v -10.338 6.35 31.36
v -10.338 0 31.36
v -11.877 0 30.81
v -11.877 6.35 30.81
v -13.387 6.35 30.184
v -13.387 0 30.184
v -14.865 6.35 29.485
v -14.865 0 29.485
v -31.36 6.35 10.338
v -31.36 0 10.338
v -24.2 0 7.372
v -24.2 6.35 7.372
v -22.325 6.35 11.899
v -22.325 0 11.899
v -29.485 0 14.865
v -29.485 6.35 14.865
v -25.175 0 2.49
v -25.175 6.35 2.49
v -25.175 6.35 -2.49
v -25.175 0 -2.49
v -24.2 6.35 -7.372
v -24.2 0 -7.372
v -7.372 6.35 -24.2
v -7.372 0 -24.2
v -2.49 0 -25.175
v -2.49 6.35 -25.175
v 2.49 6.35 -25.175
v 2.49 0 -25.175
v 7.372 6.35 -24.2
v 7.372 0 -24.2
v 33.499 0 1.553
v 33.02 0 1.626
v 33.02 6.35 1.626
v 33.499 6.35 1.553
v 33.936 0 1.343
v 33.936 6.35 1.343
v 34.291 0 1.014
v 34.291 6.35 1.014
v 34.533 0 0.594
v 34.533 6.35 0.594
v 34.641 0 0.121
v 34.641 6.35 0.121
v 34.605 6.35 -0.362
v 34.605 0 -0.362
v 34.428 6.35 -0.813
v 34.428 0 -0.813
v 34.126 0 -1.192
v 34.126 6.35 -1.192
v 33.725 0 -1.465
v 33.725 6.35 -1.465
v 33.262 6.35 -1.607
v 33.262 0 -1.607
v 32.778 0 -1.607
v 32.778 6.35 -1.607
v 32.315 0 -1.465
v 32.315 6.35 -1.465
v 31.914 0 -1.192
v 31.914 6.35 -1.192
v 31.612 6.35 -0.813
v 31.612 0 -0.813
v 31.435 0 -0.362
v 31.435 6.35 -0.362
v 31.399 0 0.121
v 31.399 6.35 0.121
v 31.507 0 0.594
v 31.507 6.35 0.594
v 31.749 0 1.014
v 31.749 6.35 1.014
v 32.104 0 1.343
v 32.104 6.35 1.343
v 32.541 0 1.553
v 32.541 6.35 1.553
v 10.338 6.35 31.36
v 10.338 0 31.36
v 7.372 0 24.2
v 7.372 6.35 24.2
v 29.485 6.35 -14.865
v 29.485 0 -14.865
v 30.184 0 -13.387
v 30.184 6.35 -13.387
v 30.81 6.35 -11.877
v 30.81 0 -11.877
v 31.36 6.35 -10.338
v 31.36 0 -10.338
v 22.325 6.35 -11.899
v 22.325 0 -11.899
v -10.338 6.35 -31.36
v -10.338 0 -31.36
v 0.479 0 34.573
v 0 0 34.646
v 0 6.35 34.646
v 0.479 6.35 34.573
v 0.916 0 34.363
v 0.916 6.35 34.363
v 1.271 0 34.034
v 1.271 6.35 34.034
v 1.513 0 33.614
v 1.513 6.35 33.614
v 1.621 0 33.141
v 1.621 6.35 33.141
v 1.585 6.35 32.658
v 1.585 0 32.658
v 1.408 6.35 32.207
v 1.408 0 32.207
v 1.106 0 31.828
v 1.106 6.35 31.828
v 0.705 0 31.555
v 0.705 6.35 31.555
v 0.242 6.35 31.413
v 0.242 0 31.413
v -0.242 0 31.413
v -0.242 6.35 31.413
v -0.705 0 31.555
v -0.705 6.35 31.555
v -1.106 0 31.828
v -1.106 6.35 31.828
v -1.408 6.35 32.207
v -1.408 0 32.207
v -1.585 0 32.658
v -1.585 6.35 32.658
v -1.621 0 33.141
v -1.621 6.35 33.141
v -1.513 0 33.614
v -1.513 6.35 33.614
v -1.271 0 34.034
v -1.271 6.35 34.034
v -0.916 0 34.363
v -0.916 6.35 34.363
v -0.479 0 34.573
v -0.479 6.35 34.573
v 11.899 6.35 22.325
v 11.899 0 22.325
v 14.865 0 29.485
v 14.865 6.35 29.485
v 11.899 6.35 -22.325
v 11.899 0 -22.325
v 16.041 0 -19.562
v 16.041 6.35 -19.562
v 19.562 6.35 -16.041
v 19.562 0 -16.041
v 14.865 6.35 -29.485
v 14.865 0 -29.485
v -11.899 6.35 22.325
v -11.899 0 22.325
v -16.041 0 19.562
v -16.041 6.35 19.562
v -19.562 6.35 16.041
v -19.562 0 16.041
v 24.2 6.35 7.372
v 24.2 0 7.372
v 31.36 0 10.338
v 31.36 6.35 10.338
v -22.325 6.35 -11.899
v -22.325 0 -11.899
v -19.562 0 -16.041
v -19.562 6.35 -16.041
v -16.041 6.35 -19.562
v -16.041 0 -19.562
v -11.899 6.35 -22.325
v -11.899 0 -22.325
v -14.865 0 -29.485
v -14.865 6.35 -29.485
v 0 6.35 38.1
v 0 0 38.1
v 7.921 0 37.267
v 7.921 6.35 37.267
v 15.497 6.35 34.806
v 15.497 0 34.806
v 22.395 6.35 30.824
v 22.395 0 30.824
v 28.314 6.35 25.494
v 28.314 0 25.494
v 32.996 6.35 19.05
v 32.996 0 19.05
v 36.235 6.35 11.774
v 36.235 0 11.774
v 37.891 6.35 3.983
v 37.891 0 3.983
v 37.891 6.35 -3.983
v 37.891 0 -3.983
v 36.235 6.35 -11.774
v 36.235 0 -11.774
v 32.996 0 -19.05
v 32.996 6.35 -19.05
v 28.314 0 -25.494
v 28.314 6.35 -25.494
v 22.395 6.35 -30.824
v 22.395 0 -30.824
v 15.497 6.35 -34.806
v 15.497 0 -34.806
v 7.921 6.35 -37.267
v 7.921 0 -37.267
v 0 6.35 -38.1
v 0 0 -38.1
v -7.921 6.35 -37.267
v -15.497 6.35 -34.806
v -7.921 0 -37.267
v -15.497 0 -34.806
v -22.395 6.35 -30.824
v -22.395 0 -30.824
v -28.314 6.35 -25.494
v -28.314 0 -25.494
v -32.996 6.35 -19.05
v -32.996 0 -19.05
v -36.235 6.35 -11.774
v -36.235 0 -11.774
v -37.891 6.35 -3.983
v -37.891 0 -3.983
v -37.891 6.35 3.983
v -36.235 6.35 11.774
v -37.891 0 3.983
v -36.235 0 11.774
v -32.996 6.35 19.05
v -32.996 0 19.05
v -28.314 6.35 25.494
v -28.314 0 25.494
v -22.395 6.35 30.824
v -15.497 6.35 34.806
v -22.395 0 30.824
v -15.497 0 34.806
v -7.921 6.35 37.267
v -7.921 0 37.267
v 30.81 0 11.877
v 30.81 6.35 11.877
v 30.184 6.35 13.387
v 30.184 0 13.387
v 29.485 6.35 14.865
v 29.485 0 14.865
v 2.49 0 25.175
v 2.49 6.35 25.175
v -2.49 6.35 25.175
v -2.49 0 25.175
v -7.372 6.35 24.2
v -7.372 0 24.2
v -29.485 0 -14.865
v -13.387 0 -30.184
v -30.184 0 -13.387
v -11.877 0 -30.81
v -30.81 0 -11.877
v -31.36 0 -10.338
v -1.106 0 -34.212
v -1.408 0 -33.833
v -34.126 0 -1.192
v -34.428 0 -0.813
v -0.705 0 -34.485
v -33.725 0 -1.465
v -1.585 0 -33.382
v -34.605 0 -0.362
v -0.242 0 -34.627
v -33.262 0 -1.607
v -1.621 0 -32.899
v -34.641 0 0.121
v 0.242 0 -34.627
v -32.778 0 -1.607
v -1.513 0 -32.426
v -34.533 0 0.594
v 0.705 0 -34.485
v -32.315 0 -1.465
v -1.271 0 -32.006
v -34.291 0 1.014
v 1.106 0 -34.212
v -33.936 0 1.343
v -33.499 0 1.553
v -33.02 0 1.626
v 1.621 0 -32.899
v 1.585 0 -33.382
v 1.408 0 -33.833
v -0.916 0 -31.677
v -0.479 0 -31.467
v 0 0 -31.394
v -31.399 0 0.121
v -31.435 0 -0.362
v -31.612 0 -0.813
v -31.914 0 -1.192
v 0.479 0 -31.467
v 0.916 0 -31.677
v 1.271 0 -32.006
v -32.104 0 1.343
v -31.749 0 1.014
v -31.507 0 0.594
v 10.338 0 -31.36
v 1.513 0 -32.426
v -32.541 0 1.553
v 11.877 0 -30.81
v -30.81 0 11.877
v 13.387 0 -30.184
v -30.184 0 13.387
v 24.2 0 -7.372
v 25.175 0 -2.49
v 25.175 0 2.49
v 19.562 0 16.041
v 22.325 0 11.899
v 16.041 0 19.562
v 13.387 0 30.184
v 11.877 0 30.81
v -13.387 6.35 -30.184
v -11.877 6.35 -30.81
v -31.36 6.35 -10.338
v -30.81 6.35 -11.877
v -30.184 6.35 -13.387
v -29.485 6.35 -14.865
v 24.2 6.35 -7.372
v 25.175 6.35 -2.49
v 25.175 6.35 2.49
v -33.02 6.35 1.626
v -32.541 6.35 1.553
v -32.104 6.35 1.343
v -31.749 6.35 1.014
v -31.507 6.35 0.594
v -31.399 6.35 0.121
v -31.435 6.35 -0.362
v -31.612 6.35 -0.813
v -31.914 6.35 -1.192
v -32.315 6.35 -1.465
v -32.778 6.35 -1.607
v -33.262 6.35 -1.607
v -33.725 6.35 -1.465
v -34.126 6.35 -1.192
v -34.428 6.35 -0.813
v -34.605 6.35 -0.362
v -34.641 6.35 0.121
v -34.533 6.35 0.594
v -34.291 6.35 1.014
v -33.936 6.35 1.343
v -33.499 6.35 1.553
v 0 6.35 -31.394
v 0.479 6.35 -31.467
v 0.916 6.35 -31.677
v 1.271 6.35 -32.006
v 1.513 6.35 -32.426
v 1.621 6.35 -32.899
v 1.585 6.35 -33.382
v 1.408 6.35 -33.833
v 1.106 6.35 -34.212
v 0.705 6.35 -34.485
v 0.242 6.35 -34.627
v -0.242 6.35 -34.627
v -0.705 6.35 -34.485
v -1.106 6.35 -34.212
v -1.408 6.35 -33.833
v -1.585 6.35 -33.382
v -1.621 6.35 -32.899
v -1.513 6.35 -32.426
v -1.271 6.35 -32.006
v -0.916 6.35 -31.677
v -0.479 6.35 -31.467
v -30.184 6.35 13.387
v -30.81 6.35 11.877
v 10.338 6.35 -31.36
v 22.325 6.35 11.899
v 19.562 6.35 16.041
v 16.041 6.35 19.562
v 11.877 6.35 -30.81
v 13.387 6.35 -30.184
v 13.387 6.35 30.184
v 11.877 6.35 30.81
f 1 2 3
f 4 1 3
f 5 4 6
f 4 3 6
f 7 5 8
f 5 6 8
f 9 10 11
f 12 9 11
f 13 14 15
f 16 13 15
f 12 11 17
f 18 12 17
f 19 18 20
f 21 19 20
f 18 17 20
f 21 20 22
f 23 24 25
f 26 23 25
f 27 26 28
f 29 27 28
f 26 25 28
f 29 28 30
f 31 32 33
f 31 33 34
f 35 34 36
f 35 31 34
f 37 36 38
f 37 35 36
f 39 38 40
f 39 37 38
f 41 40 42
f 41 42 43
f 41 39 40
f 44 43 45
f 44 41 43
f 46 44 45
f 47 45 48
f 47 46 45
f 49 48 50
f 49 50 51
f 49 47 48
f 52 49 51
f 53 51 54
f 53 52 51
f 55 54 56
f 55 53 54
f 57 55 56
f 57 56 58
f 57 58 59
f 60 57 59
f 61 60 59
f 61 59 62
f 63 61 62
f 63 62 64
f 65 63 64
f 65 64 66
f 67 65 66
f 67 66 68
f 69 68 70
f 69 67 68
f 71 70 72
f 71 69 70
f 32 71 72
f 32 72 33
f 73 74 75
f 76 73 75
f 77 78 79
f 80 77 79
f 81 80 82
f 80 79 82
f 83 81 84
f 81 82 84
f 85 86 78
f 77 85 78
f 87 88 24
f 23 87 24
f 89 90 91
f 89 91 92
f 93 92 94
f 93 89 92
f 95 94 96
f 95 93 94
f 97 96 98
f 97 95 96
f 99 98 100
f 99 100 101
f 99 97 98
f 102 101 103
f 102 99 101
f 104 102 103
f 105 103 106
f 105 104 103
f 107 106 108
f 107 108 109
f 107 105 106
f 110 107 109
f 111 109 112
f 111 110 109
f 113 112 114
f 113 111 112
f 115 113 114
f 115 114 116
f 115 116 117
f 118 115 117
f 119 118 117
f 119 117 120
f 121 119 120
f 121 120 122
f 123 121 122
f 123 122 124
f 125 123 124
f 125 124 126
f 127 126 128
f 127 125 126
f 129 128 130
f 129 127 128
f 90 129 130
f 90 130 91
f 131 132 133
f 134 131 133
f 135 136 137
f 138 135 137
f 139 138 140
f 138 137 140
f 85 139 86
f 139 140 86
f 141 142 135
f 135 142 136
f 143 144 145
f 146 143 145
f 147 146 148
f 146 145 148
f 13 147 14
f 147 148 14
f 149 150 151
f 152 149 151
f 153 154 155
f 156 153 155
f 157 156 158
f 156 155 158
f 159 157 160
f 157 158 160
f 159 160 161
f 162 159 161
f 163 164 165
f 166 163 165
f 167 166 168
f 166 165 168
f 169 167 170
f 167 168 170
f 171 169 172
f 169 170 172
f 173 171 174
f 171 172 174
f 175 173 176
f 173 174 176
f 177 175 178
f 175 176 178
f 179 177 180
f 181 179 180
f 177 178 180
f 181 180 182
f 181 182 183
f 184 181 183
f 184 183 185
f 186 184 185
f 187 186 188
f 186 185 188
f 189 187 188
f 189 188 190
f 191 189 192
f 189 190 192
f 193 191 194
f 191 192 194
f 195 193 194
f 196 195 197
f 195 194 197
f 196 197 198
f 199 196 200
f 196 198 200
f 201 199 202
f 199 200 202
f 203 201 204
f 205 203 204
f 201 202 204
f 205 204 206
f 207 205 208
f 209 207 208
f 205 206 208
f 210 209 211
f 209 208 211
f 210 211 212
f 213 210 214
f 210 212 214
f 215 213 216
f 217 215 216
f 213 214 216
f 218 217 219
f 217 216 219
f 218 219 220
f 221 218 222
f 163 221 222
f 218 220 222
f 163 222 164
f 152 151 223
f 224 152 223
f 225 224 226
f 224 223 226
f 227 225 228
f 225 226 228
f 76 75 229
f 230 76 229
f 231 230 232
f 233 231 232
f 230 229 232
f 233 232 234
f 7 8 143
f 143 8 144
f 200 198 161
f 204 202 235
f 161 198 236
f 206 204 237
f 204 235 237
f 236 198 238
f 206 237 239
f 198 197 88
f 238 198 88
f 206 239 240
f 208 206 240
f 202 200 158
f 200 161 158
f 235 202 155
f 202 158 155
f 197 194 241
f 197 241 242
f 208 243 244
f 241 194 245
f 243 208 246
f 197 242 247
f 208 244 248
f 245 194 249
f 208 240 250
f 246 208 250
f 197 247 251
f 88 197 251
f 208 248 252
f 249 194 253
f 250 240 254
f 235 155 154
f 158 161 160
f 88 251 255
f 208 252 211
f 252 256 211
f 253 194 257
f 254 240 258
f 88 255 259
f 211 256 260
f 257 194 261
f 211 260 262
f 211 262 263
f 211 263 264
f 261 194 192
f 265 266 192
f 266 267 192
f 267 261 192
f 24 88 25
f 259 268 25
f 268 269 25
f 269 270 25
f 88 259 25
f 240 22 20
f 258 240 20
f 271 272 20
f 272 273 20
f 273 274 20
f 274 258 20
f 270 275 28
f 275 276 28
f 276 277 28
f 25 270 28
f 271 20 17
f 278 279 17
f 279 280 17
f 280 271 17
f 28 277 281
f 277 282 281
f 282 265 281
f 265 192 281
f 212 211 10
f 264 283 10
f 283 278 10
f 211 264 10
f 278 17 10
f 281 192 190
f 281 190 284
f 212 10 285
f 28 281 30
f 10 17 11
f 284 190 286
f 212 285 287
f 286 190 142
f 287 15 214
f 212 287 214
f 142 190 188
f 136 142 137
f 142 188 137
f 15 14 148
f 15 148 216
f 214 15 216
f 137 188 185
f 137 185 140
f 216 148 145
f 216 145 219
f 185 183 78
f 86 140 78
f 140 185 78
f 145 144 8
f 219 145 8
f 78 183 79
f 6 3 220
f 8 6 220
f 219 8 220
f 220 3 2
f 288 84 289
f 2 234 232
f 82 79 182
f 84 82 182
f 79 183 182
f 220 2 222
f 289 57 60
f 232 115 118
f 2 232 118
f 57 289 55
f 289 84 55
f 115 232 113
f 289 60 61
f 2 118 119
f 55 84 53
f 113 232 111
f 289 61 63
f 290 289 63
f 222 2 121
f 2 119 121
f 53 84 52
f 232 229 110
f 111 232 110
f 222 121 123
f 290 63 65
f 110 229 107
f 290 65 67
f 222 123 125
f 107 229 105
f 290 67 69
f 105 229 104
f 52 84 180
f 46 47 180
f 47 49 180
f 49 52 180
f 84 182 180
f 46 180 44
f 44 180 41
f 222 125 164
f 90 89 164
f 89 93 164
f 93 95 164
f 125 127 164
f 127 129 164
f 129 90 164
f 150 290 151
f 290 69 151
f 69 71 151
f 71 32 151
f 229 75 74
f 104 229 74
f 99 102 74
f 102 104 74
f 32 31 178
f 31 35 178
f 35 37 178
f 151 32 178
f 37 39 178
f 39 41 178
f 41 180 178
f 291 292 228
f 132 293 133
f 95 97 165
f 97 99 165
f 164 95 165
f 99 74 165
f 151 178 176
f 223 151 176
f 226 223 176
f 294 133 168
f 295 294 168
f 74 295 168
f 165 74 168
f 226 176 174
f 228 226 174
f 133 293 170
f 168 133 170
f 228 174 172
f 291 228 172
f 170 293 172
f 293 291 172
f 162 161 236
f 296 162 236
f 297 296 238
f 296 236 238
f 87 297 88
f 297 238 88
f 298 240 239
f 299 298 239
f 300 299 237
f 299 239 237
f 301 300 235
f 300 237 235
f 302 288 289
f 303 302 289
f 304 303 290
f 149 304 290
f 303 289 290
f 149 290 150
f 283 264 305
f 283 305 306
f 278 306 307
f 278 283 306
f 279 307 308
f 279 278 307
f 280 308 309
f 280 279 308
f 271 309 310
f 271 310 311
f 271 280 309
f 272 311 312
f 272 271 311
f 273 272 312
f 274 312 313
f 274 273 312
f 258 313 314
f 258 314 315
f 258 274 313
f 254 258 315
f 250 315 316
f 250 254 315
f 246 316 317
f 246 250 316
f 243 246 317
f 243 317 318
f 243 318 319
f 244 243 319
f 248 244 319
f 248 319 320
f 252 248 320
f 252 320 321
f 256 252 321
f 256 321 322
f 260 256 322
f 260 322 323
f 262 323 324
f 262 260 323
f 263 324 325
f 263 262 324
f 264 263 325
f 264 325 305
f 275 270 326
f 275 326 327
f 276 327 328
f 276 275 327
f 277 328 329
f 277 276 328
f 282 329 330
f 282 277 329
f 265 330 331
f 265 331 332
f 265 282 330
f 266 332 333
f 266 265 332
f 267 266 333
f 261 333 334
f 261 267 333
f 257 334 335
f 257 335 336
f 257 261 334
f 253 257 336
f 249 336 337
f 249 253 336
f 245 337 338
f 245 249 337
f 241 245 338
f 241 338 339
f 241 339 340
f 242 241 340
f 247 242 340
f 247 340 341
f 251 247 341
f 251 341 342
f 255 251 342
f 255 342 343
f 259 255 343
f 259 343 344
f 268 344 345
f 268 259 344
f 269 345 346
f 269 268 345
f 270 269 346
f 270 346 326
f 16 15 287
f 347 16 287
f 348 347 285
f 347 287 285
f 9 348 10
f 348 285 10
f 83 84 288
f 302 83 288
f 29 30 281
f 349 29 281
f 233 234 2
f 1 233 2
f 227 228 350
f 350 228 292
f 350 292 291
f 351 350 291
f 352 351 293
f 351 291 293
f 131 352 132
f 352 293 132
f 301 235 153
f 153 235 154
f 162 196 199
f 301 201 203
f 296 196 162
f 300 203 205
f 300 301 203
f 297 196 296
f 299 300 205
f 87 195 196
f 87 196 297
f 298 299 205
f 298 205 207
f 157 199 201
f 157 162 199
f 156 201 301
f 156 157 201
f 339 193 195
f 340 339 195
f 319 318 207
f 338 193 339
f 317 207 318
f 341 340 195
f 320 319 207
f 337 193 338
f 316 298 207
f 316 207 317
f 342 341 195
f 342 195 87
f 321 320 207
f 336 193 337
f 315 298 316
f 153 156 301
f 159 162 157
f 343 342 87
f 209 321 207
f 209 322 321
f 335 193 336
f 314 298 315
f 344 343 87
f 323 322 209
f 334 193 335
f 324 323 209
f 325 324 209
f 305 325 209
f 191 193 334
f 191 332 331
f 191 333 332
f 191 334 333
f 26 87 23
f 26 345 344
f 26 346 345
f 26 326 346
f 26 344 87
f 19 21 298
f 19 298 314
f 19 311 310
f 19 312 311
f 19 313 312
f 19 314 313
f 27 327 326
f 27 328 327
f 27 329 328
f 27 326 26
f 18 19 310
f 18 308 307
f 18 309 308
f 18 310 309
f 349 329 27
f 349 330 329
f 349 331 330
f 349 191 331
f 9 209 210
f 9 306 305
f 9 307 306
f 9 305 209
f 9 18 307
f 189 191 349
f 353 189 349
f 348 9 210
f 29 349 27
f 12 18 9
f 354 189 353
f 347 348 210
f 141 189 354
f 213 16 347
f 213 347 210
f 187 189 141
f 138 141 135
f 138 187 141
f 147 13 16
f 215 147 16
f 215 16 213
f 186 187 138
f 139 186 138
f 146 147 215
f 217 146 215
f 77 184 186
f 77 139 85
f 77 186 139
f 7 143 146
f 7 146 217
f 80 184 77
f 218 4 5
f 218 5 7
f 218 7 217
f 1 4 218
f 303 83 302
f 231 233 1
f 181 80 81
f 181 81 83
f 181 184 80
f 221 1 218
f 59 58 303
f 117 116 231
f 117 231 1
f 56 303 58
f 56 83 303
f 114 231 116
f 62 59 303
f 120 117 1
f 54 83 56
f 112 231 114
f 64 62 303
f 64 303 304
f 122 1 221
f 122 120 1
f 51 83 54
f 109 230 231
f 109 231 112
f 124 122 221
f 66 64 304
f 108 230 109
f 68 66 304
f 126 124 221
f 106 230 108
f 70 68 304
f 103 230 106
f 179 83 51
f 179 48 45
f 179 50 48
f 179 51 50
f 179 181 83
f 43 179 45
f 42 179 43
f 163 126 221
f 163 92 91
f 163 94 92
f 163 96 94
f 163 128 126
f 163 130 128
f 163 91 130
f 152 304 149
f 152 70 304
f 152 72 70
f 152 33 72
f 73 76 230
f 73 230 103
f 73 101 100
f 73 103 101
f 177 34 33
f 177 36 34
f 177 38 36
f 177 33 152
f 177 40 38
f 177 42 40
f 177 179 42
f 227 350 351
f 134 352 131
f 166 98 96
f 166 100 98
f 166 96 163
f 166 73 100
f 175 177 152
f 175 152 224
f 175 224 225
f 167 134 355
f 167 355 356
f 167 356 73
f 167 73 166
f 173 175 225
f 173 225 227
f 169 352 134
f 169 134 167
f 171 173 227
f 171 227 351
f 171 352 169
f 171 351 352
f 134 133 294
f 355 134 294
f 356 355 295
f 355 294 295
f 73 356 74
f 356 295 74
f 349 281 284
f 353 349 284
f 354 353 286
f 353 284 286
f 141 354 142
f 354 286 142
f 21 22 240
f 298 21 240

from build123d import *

# Parameters (mm, degrees)
SKETCH1_R           = 38.1
SKETCH1_R_2         = 1.6256
BOSS_EXTRUDE1_DEPTH = 6.35


with BuildPart() as part:
    # Sketch1 → Boss-Extrude1 (new body)
    with BuildSketch(Plane(origin=(0, 0, 0), x_dir=(1, 0, 0), z_dir=(0, 1, 0))):
        with Locations(Location((0, 0, 0), (0, 0, 270))):
            Circle(SKETCH1_R)
        with Locations(Location((0, 33.02, 0), (0, 0, 270))):
            Circle(SKETCH1_R_2, mode=Mode.SUBTRACT)
        with Locations(Location((33.02, 0, 0), (0, 0, 270))):
            Circle(SKETCH1_R_2, mode=Mode.SUBTRACT)
        with Locations(Location((0, -33.02, 0), (0, 0, 270))):
            Circle(SKETCH1_R_2, mode=Mode.SUBTRACT)
        with Locations(Location((-33.02, 0, 0), (0, 0, 270))):
            Circle(SKETCH1_R_2, mode=Mode.SUBTRACT)
        with BuildLine():
            Line((29.48483871, -14.864880969), (22.32486724, -11.89912368))
            ThreePointArc((22.32486724, -11.89912368), (17.888387876, -17.888387876), (11.89912368, -22.32486724))
            Line((11.89912368, -22.32486724), (14.864880969, -29.48483871))
            ThreePointArc((14.864880969, -29.48483871), (12.636206937, -30.506502164), (10.33787126, -31.359987529))
            Line((10.33787126, -31.359987529), (7.37211397, -24.200016059))
            ThreePointArc((7.37211397, -24.200016059), (0, -25.298000744), (-7.37211397, -24.200016059))
            Line((-7.37211397, -24.200016059), (-10.33787126, -31.359987529))
            ThreePointArc((-10.33787126, -31.359987529), (-12.636206937, -30.506502164), (-14.864880969, -29.48483871))
            Line((-14.864880969, -29.48483871), (-11.89912368, -22.32486724))
            ThreePointArc((-11.89912368, -22.32486724), (-17.888387876, -17.888387876), (-22.32486724, -11.89912368))
            Line((-22.32486724, -11.89912368), (-29.48483871, -14.864880969))
            ThreePointArc((-29.48483871, -14.864880969), (-30.506502164, -12.636206937), (-31.359987529, -10.33787126))
            Line((-31.359987529, -10.33787126), (-24.200016059, -7.37211397))
            ThreePointArc((-24.200016059, -7.37211397), (-25.298000744, 0), (-24.200016059, 7.37211397))
            Line((-24.200016059, 7.37211397), (-31.359987529, 10.33787126))
            ThreePointArc((-31.359987529, 10.33787126), (-30.506502164, 12.636206937), (-29.48483871, 14.864880969))
            Line((-29.48483871, 14.864880969), (-22.32486724, 11.89912368))
            ThreePointArc((-22.32486724, 11.89912368), (-17.888387876, 17.888387876), (-11.89912368, 22.32486724))
            Line((-11.89912368, 22.32486724), (-14.864880969, 29.48483871))
            ThreePointArc((-14.864880969, 29.48483871), (-12.636206937, 30.506502164), (-10.33787126, 31.359987529))
            Line((-10.33787126, 31.359987529), (-7.37211397, 24.200016059))
            ThreePointArc((-7.37211397, 24.200016059), (0, 25.298000744), (7.37211397, 24.200016059))
            Line((7.37211397, 24.200016059), (10.33787126, 31.359987529))
            ThreePointArc((10.33787126, 31.359987529), (12.636206937, 30.506502164), (14.864880969, 29.48483871))
            Line((14.864880969, 29.48483871), (11.89912368, 22.32486724))
            ThreePointArc((11.89912368, 22.32486724), (17.888387876, 17.888387876), (22.32486724, 11.89912368))
            Line((22.32486724, 11.89912368), (29.48483871, 14.864880969))
            ThreePointArc((29.48483871, 14.864880969), (30.506502164, 12.636206937), (31.359987529, 10.33787126))
            Line((31.359987529, 10.33787126), (24.200016059, 7.37211397))
            ThreePointArc((24.200016059, 7.37211397), (25.298000744, 0), (24.200016059, -7.37211397))
            Line((24.200016059, -7.37211397), (31.359987529, -10.33787126))
            ThreePointArc((31.359987529, -10.33787126), (30.506502164, -12.636206937), (29.48483871, -14.864880969))
        make_face(mode=Mode.SUBTRACT)
    extrude(amount=BOSS_EXTRUDE1_DEPTH)


solid = part.part
